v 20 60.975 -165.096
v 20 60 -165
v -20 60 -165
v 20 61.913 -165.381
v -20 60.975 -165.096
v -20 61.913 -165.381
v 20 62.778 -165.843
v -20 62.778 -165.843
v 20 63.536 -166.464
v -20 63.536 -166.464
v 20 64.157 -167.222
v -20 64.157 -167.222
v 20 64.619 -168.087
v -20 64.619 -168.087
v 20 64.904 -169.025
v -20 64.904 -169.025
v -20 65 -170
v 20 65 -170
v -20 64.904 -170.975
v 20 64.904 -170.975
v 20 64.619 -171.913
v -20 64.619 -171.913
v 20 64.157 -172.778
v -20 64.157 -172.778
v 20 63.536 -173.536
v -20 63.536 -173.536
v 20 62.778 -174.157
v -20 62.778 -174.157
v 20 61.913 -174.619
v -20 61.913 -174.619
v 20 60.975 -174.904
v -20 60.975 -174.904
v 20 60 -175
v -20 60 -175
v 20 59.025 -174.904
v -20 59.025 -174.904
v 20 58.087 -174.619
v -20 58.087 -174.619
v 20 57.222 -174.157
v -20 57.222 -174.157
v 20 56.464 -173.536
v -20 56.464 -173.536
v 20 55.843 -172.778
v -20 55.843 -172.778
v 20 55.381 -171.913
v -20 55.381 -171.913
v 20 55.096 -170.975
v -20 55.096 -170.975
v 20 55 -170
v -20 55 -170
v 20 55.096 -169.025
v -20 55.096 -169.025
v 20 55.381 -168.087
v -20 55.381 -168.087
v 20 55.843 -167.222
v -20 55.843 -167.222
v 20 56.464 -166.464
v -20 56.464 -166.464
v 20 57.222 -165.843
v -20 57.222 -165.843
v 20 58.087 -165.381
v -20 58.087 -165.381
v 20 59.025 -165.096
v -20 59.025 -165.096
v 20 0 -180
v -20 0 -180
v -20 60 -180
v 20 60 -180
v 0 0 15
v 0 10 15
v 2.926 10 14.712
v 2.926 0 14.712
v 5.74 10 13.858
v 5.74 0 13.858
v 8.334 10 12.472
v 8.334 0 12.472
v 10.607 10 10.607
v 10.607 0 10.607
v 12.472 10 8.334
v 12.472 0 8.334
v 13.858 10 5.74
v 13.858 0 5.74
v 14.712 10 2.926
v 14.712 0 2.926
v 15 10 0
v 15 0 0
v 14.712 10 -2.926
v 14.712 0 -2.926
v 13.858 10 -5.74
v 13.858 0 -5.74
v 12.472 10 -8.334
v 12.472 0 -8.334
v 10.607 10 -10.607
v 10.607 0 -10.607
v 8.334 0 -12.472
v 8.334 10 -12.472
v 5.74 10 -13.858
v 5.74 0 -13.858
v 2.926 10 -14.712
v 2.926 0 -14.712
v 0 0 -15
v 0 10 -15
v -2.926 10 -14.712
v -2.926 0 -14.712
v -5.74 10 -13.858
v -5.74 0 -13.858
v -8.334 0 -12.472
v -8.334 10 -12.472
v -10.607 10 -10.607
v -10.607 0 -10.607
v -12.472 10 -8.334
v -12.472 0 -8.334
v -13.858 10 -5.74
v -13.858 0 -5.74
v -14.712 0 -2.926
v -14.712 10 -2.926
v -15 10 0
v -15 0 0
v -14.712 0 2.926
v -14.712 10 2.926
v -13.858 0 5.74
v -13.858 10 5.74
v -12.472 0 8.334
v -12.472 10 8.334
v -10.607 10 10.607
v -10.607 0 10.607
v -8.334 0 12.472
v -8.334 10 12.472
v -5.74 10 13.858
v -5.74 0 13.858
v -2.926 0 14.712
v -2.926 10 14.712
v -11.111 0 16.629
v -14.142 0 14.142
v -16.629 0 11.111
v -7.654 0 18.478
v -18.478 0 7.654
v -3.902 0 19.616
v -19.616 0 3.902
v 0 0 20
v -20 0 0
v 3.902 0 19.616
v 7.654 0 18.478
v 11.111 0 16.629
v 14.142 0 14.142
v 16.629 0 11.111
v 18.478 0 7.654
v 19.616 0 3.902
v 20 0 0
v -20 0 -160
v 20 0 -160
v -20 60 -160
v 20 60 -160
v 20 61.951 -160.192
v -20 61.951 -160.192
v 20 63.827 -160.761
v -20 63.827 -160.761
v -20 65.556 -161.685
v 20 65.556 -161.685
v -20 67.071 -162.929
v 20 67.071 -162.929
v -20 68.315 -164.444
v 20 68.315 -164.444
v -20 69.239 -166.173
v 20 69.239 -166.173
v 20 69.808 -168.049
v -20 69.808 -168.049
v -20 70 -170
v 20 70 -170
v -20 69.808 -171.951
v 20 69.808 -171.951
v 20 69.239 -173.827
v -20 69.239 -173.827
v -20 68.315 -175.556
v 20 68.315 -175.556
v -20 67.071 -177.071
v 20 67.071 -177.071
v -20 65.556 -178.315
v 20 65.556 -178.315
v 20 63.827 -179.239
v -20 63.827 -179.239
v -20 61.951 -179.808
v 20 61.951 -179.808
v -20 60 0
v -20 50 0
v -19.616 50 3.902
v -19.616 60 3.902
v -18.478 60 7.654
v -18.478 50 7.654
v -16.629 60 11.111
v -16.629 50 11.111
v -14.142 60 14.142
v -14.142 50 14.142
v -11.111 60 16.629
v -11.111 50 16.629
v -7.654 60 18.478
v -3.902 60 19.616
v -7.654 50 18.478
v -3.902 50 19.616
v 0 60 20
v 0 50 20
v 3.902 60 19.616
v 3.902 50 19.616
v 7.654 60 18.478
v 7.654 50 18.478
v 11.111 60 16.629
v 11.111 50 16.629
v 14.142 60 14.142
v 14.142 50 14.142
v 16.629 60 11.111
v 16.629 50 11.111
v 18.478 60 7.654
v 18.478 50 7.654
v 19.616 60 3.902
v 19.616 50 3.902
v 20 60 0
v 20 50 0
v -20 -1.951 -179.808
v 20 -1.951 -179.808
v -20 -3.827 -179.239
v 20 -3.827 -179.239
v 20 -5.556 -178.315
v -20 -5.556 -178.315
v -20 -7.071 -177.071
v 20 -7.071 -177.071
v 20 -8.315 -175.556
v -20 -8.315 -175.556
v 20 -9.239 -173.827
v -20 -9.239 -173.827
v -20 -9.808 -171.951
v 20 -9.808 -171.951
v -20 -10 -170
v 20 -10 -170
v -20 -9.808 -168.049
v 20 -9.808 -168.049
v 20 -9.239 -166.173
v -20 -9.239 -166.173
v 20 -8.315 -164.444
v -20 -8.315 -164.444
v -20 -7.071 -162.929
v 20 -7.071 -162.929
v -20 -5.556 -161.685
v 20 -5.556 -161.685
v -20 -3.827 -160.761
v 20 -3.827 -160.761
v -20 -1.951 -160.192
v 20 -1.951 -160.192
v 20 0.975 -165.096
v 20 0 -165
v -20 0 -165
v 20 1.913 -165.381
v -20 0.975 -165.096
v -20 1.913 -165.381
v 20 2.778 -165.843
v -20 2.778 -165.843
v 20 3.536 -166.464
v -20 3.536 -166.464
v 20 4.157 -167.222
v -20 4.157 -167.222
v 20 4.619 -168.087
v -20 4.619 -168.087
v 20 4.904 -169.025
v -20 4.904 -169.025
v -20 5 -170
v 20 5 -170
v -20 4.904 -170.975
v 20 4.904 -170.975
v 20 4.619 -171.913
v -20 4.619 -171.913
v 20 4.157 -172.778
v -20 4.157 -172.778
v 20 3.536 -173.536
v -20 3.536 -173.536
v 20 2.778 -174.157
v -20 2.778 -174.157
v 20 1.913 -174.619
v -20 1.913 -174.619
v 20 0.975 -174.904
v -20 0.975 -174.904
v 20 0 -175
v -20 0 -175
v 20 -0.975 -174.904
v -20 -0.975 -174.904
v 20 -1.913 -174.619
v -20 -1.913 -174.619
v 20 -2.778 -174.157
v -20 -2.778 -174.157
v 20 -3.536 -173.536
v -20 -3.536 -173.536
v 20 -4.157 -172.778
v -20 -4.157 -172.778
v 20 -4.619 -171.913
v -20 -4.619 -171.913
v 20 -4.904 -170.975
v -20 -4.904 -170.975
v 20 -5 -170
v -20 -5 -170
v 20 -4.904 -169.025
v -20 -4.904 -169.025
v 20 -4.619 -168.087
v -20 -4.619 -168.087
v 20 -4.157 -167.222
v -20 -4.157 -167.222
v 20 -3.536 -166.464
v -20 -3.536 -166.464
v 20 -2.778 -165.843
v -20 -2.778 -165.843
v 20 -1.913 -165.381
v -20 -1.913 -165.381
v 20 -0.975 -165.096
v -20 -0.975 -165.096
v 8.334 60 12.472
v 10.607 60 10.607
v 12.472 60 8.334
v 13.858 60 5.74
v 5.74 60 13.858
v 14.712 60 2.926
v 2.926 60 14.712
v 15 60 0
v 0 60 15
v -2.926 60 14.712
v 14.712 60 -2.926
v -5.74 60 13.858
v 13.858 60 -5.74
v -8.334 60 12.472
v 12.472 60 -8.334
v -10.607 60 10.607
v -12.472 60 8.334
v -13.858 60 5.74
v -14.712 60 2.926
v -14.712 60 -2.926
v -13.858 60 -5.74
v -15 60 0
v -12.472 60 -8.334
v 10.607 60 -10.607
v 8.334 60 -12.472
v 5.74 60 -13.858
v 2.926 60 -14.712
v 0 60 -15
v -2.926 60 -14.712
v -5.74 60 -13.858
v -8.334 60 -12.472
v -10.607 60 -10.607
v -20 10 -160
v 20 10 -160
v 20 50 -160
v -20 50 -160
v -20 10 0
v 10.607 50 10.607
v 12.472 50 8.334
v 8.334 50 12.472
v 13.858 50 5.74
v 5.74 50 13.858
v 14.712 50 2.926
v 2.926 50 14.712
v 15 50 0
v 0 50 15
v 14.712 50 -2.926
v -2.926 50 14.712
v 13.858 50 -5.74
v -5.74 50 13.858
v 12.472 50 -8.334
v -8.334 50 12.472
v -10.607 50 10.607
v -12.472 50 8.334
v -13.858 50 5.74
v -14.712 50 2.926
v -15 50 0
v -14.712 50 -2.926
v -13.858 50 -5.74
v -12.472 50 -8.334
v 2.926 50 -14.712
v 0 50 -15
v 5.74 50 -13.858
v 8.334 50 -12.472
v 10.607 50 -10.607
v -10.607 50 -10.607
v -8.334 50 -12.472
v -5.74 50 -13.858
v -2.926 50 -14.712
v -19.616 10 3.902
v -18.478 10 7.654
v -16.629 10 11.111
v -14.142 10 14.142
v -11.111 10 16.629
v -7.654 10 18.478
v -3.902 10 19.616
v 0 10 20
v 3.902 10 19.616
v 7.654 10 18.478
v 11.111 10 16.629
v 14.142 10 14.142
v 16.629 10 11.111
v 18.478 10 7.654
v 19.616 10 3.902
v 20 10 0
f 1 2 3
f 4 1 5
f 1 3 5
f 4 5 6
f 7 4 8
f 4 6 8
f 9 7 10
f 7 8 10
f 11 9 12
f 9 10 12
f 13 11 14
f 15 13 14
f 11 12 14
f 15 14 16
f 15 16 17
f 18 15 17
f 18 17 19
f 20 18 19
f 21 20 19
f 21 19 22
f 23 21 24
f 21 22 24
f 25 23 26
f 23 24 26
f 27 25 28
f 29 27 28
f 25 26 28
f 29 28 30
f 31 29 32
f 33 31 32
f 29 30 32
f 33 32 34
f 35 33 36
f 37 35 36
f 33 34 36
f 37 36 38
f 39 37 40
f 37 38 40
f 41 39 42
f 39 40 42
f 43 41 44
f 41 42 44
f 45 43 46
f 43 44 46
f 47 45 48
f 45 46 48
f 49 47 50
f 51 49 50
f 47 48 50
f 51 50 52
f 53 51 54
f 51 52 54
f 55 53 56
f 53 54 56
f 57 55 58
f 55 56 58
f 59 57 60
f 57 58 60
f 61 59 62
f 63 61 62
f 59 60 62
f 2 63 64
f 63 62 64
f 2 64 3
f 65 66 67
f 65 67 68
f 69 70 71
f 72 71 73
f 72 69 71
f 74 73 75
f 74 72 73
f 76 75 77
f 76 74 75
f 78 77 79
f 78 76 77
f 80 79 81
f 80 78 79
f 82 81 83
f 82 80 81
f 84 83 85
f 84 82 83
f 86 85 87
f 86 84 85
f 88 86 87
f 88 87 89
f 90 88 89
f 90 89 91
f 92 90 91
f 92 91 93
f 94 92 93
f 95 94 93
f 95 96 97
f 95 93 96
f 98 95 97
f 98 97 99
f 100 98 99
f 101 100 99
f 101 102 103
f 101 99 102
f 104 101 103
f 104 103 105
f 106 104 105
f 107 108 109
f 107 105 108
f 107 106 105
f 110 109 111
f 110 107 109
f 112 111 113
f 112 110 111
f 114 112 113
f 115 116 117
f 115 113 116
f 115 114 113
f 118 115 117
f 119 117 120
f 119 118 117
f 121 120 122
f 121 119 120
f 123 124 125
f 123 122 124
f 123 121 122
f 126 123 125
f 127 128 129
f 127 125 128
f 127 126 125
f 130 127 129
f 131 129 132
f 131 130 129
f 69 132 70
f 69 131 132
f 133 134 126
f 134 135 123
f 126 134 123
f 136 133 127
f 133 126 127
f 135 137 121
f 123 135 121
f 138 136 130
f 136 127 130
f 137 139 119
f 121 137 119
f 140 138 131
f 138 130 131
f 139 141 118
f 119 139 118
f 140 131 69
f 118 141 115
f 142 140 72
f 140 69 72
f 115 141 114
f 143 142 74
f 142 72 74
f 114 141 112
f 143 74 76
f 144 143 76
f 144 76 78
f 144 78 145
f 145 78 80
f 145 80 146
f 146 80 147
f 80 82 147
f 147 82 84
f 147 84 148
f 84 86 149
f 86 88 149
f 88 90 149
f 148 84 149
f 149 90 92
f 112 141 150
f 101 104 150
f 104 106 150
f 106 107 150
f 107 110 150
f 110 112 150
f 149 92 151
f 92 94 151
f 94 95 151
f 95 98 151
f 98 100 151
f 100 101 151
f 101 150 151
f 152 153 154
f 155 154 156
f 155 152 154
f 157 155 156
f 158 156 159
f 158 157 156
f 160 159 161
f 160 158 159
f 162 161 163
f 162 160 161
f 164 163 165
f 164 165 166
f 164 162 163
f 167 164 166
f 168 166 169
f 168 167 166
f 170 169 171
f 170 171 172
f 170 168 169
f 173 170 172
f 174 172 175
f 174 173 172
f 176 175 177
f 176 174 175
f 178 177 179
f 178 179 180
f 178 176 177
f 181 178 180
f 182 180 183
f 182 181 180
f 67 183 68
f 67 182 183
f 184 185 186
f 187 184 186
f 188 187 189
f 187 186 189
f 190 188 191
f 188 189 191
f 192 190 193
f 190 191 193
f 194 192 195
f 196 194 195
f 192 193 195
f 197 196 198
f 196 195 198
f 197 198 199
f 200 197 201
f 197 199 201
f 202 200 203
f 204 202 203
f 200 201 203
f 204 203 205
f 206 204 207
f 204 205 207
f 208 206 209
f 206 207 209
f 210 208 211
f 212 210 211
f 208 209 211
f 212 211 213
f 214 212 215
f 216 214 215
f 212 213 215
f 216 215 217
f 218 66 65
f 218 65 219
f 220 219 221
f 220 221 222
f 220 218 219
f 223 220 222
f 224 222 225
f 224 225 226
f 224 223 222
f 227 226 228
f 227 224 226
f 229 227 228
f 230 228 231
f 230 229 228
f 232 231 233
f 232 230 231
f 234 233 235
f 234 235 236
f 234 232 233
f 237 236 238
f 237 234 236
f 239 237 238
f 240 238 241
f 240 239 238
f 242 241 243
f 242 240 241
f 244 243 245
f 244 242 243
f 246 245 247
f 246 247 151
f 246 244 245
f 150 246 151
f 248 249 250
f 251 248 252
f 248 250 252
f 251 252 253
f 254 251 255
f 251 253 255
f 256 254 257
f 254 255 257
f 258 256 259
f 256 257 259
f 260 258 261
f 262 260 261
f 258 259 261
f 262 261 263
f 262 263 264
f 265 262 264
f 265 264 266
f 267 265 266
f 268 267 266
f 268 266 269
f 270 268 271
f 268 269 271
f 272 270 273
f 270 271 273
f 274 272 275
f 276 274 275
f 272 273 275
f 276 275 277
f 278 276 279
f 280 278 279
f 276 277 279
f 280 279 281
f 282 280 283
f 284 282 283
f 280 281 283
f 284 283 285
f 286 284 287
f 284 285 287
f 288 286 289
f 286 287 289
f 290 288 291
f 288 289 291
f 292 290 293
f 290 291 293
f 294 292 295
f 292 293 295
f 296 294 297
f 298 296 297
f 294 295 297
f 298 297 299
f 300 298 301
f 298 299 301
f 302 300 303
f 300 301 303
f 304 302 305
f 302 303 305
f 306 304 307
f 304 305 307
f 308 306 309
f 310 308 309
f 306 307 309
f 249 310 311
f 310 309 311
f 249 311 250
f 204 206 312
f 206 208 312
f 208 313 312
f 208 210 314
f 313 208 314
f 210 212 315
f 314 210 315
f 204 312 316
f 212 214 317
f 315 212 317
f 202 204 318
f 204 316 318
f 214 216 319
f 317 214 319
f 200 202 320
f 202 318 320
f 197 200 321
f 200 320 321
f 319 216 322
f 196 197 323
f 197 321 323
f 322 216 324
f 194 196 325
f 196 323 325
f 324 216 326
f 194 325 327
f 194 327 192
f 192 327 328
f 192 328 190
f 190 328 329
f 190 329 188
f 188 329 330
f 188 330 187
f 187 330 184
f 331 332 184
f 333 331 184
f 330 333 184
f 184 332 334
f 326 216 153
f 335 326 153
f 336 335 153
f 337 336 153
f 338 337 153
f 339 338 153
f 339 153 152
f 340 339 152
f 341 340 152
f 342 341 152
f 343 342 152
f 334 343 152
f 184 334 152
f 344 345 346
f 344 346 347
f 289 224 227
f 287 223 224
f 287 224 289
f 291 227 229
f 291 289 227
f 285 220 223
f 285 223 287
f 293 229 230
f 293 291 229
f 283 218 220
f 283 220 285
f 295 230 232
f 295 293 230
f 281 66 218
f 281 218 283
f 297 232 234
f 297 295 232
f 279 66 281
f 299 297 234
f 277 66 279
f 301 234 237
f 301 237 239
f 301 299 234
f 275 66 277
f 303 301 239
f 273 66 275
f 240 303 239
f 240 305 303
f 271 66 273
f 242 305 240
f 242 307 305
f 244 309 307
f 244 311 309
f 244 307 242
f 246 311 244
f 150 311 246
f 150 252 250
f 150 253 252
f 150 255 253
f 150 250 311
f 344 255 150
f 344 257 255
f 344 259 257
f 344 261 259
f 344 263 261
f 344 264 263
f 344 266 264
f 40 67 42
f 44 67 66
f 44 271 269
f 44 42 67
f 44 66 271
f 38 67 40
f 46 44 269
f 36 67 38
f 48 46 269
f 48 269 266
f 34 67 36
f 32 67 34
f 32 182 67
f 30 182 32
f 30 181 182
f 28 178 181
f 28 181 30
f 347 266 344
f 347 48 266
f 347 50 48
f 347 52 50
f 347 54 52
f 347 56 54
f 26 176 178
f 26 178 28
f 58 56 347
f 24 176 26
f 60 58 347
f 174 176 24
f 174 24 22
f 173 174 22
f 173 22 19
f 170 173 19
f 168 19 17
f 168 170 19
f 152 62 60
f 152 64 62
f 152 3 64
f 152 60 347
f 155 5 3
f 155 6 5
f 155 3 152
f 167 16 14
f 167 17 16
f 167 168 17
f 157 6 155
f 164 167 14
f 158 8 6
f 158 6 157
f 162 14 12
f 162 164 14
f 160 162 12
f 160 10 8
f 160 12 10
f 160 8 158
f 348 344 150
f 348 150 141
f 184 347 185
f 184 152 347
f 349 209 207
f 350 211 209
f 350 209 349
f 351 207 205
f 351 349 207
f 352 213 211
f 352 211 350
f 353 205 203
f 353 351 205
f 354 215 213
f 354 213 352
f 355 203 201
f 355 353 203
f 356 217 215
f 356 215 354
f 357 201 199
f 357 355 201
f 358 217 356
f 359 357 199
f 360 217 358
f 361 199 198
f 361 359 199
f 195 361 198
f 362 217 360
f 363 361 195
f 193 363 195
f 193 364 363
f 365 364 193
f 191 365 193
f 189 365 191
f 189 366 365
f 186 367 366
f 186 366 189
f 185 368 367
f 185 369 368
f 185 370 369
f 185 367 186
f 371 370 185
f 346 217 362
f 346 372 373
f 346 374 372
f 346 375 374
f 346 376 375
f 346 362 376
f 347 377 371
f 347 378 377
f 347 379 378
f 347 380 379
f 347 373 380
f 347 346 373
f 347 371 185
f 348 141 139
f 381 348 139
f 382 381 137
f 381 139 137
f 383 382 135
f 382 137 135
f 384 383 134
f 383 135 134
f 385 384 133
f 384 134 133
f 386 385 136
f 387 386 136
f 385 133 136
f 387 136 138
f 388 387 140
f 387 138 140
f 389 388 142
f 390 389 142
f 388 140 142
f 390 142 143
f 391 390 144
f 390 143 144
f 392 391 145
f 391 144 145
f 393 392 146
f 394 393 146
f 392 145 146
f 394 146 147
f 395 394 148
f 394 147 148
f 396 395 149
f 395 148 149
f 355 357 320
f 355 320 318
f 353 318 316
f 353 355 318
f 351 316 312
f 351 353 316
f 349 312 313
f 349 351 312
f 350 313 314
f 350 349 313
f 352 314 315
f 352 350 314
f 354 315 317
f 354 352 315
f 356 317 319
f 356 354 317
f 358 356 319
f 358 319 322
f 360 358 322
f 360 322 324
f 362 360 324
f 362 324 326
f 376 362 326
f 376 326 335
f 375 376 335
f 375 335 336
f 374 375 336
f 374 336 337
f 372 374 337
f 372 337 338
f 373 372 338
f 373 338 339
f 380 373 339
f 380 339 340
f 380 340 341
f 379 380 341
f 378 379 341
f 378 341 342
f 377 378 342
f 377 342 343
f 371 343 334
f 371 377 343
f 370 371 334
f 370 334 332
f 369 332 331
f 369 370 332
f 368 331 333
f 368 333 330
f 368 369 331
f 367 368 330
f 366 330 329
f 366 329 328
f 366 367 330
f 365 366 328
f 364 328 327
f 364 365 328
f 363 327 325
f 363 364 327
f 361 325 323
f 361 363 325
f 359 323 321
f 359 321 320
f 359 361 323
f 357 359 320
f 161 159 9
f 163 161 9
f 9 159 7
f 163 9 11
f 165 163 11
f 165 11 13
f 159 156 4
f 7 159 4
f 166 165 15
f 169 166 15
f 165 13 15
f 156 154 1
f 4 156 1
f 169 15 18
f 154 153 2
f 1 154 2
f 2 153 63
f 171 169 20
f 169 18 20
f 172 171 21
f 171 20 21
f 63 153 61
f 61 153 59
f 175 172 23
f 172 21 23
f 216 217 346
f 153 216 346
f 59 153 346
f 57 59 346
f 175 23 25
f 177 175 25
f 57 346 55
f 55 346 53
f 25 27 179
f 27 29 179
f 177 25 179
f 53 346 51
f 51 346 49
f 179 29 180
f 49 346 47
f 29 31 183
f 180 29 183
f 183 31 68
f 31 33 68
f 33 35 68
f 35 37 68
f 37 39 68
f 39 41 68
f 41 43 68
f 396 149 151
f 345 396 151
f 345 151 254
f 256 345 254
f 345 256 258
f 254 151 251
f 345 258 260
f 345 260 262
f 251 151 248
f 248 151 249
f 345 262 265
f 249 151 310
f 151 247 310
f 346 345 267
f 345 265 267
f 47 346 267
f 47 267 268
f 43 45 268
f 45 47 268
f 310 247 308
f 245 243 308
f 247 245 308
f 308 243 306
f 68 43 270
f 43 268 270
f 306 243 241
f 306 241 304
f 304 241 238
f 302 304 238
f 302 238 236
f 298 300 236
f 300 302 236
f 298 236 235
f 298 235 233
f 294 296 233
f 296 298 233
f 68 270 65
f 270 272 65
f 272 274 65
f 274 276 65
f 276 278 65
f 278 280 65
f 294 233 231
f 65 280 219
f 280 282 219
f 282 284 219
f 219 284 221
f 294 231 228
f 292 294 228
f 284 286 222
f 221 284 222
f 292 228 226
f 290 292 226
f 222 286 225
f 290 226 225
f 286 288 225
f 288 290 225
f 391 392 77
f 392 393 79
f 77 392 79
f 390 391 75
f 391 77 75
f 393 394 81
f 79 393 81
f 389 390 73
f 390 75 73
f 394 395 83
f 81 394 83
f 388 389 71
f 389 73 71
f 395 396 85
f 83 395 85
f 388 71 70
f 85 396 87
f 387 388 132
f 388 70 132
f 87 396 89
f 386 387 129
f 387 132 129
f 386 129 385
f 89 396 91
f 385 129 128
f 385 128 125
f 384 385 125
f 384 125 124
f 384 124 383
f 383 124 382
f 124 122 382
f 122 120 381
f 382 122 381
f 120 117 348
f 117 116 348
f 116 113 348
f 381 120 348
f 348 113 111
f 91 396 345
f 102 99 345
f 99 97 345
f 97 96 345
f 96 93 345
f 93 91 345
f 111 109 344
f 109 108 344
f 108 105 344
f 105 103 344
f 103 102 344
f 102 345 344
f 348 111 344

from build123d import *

# Parameters (mm, degrees)
SKETCH_1_R           = 15
EXTRUDE_1_DEPTH      = 60
SKETCH_2_W           = 40
SKETCH_2_H           = 40
CUT_EXTRUDE_1_DEPTH  = 190
EXTRUDE_2_DEPTH      = 50
EXTRUDE_2_DEPTH_BACK = 10
SKETCH_4_R           = 10
EXTRUDE_3_DEPTH      = 40
SKETCH_5_R           = 5
CUT_EXTRUDE_3_DEPTH  = 40


with BuildPart() as part:
    # 草图1 → 凸台-拉伸1 (new body)
    with BuildSketch(Plane(origin=(0, 0, 0), x_dir=(1, 0, 0), z_dir=(0, 1, 0))):
        with BuildLine():
            Line((20, 0), (20, 170))
            Line((20, 170), (-20, 170))
            Line((-20, 170), (-20, 0))
            ThreePointArc((-20, 0), (0, -20), (20, 0))
        make_face()
        with Locations(Location((0, 0, 0), (0, 0, 270))):
            Circle(SKETCH_1_R, mode=Mode.SUBTRACT)
    extrude(amount=EXTRUDE_1_DEPTH)

    # 草图2 → 切除-拉伸1 (cut)
    with BuildSketch(Plane(origin=(0, 0, -170), x_dir=(-1, 0, 0), z_dir=(0, 0, -1))):
        with Locations((0, 30)):
            Rectangle(SKETCH_2_W, SKETCH_2_H)
    extrude(amount=-CUT_EXTRUDE_1_DEPTH, mode=Mode.SUBTRACT)


with BuildPart() as cut_extrude_1_piece_1:
    # of the separate pieces the step leaves, piece 1, a body of its own (cut_extrude_1_pieces)
    add(part.part.solids().sort_by_distance((20, 50, -170))[0])



with BuildPart() as cut_extrude_1_piece_2:
    # of the separate pieces the step leaves, piece 2, a body of its own (cut_extrude_1_pieces)
    add(part.part.solids().sort_by_distance((20, 0, 0))[0])


with BuildPart() as cut_extrude_1_piece_1_1:
    add(cut_extrude_1_piece_1.part)

    add(cut_extrude_1_piece_2.part)  # 凸台-拉伸2 merges 切除-拉伸1 piece 2
    # 草图3 → 凸台-拉伸2 (add, two sides: drawn at the far end of the back side and taken through both)
    with BuildSketch(Plane(origin=(0, 10, 0), x_dir=(1, 0, 0), z_dir=(0, 1, 0)).offset(-EXTRUDE_2_DEPTH_BACK)):
        Polygon((20, 170), (20, 160), (-20, 160), (-20, 170), (-20, 180), (20, 180), align=None)
    extrude(amount=EXTRUDE_2_DEPTH + EXTRUDE_2_DEPTH_BACK)

    # 草图4 → 凸台-拉伸3 (add)
    with BuildSketch(Plane.ZY.offset(20)):
        with Locations((-170, 0)):
            Circle(SKETCH_4_R)
        with Locations((-170, 60)):
            Circle(SKETCH_4_R)
    extrude(amount=-EXTRUDE_3_DEPTH)

    # 草图5 → 切除-拉伸3 (cut)
    with BuildSketch(Plane.ZY.offset(20)):
        with Locations((-170, 0)):
            Circle(SKETCH_5_R)
        with Locations((-170, 60)):
            Circle(SKETCH_5_R)
    extrude(amount=-CUT_EXTRUDE_3_DEPTH, mode=Mode.SUBTRACT)


solid = cut_extrude_1_piece_1_1.part
